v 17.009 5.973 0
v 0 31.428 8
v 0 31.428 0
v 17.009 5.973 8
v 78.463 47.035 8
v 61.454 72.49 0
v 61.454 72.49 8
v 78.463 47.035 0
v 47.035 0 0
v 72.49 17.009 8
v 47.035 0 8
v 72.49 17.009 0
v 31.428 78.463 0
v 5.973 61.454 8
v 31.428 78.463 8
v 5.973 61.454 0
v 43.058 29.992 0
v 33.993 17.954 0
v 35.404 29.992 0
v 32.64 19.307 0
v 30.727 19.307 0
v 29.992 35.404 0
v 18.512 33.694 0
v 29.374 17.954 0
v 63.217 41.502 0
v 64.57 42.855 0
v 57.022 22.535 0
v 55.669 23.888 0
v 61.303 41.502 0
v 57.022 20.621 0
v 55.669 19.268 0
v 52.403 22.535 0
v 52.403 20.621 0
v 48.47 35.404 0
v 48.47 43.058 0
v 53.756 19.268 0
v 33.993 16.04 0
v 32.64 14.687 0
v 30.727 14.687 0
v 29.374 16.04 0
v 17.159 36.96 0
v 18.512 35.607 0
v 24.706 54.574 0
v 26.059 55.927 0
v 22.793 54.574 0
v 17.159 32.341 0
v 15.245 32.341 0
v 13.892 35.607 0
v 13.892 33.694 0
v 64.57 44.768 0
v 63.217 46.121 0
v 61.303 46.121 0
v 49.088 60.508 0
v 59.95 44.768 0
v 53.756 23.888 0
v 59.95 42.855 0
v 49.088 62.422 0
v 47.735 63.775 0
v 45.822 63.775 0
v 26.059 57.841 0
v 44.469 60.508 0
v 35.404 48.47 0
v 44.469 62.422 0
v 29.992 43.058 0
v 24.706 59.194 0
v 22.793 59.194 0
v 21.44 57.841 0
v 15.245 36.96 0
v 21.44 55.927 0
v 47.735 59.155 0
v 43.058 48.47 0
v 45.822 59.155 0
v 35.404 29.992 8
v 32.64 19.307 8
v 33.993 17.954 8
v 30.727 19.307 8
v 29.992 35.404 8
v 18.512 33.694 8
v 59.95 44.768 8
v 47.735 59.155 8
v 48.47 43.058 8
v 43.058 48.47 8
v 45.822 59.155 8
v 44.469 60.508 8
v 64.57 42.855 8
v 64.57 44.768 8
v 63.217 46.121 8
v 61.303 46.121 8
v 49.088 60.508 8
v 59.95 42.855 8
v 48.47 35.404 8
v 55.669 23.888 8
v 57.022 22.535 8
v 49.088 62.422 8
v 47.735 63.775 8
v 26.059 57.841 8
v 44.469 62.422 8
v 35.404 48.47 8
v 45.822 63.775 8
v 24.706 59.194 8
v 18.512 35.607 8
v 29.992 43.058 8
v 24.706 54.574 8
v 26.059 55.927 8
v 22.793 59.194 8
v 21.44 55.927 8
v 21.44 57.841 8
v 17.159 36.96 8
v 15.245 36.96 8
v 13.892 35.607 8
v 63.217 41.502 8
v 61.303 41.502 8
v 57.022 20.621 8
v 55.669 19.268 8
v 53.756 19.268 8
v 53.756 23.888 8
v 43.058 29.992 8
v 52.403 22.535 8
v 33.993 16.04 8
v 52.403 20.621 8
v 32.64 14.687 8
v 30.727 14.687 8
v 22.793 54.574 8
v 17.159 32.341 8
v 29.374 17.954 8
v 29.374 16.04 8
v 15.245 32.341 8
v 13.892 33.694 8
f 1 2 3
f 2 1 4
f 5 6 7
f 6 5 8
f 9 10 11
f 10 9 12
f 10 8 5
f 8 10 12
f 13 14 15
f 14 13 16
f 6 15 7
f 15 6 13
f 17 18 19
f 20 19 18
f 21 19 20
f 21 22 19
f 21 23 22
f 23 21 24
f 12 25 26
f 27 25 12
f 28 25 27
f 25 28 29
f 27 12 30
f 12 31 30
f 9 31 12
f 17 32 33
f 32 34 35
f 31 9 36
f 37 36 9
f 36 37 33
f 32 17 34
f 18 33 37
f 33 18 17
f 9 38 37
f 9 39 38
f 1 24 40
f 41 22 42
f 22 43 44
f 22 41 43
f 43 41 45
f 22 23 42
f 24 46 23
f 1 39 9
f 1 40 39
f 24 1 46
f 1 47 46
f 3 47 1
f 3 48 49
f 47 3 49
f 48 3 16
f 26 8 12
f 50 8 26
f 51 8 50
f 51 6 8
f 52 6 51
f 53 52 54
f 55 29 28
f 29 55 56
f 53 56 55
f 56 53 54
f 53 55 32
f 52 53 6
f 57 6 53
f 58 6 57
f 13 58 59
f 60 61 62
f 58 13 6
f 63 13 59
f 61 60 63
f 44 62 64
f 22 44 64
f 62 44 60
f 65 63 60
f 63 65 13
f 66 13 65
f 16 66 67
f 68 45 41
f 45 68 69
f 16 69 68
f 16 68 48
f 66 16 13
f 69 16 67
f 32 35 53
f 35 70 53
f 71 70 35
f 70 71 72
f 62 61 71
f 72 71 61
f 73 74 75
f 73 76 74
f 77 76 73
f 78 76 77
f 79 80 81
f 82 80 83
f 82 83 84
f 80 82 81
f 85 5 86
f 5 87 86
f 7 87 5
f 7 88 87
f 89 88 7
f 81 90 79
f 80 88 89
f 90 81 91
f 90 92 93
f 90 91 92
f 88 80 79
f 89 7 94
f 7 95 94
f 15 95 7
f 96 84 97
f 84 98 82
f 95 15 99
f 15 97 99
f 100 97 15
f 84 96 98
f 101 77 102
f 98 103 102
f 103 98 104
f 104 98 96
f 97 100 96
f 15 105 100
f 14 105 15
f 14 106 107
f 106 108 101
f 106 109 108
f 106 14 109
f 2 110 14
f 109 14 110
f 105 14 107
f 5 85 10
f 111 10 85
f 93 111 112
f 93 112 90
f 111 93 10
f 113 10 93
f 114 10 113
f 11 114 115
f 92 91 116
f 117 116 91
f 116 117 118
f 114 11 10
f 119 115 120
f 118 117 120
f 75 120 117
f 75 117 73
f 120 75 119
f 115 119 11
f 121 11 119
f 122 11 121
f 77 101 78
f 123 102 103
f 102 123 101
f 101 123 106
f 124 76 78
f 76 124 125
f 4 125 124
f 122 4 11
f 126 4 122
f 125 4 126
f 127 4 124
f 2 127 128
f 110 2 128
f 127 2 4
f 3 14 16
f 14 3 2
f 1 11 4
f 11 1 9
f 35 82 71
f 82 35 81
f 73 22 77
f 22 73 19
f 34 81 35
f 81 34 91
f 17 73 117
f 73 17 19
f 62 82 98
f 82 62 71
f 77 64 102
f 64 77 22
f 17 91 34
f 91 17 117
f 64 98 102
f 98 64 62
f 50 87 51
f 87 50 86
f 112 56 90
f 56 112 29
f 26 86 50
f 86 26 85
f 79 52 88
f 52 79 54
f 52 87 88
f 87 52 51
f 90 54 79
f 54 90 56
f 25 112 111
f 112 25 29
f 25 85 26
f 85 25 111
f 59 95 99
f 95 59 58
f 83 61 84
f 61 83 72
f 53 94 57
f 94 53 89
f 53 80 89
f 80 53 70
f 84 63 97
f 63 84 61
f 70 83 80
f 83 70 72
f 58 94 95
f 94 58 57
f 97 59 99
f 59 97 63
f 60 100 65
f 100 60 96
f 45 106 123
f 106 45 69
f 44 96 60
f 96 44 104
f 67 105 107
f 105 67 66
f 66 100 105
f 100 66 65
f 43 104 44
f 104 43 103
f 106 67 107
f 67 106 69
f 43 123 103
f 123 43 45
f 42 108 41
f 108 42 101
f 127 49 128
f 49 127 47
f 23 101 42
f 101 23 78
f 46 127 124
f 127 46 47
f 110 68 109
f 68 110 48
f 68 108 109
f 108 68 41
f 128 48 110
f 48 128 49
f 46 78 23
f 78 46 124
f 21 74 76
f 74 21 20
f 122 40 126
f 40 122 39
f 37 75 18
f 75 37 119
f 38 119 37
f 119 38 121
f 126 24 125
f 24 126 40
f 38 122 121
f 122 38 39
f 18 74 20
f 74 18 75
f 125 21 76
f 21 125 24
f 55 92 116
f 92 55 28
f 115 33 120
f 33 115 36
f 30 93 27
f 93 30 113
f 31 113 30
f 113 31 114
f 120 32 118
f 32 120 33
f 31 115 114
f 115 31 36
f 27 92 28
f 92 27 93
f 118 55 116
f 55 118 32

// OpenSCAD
$fn = 32;

// ----------------------------------------------------------------------
// Polygon plate: 8-gon R40, 6 bolt windows
// ----------------------------------------------------------------------

// --- parameters (mm) ---
sides = 8;                // number of polygon sides
plate_r = 40;             // circumscribed radius of the polygon
bore_r = 10;              // centre bore radius
bolts = 6;                // number of bolt windows
ring_r = 23.48;           // bolt-circle radius
bolt_r = 2.5;             // bolt window radius
plate_t = 8;              // plate thickness, Z (extrusion height)

plate_d = 2 * plate_r;  // circumscribed diameter
bore_d = 2 * bore_r;  // centre bore diameter
bolt_d = 2 * bolt_r;  // bolt window diameter
ring_d = 2 * ring_r;  // bolt-circle diameter

profile = [[78.463, 47.035], [61.454, 72.49], [31.428, 78.463], [5.973, 61.454], [0, 31.428], [17.009, 5.973], [47.035, 0], [72.49, 17.009]];  // primary outline, 8 points, counter clockwise
void_1 = [[48.47, 43.058], [43.058, 48.47], [35.404, 48.47], [29.992, 43.058], [29.992, 35.404], [35.404, 29.992], [43.058, 29.992], [48.47, 35.404]];  // centre bore, 8 points
void_2 = [[64.57, 44.768], [63.217, 46.121], [61.303, 46.121], [59.95, 44.768], [59.95, 42.855], [61.303, 41.502], [63.217, 41.502], [64.57, 42.855]];  // bolt window 1, 8 points
void_3 = [[49.088, 62.422], [47.735, 63.775], [45.822, 63.775], [44.469, 62.422], [44.469, 60.508], [45.822, 59.155], [47.735, 59.155], [49.088, 60.508]];  // bolt window 2, 8 points
void_4 = [[26.059, 57.841], [24.706, 59.194], [22.793, 59.194], [21.44, 57.841], [21.44, 55.927], [22.793, 54.574], [24.706, 54.574], [26.059, 55.927]];  // bolt window 3, 8 points
void_5 = [[18.512, 35.607], [17.159, 36.96], [15.245, 36.96], [13.892, 35.607], [13.892, 33.694], [15.245, 32.341], [17.159, 32.341], [18.512, 33.694]];  // bolt window 4, 8 points
void_6 = [[33.993, 17.954], [32.64, 19.307], [30.727, 19.307], [29.374, 17.954], [29.374, 16.04], [30.727, 14.687], [32.64, 14.687], [33.993, 16.04]];  // bolt window 5, 8 points
void_7 = [[57.022, 22.535], [55.669, 23.888], [53.756, 23.888], [52.403, 22.535], [52.403, 20.621], [53.756, 19.268], [55.669, 19.268], [57.022, 20.621]];  // bolt window 6, 8 points

// --- the one profile operation ---
difference() {
  linear_extrude(height = plate_t) polygon(points = profile);
  translate([0, 0, -1])
    linear_extrude(height = plate_t + 2) polygon(points = void_1);
  translate([0, 0, -1])
    linear_extrude(height = plate_t + 2) polygon(points = void_2);
  translate([0, 0, -1])
    linear_extrude(height = plate_t + 2) polygon(points = void_3);
  translate([0, 0, -1])
    linear_extrude(height = plate_t + 2) polygon(points = void_4);
  translate([0, 0, -1])
    linear_extrude(height = plate_t + 2) polygon(points = void_5);
  translate([0, 0, -1])
    linear_extrude(height = plate_t + 2) polygon(points = void_6);
  translate([0, 0, -1])
    linear_extrude(height = plate_t + 2) polygon(points = void_7);
}
